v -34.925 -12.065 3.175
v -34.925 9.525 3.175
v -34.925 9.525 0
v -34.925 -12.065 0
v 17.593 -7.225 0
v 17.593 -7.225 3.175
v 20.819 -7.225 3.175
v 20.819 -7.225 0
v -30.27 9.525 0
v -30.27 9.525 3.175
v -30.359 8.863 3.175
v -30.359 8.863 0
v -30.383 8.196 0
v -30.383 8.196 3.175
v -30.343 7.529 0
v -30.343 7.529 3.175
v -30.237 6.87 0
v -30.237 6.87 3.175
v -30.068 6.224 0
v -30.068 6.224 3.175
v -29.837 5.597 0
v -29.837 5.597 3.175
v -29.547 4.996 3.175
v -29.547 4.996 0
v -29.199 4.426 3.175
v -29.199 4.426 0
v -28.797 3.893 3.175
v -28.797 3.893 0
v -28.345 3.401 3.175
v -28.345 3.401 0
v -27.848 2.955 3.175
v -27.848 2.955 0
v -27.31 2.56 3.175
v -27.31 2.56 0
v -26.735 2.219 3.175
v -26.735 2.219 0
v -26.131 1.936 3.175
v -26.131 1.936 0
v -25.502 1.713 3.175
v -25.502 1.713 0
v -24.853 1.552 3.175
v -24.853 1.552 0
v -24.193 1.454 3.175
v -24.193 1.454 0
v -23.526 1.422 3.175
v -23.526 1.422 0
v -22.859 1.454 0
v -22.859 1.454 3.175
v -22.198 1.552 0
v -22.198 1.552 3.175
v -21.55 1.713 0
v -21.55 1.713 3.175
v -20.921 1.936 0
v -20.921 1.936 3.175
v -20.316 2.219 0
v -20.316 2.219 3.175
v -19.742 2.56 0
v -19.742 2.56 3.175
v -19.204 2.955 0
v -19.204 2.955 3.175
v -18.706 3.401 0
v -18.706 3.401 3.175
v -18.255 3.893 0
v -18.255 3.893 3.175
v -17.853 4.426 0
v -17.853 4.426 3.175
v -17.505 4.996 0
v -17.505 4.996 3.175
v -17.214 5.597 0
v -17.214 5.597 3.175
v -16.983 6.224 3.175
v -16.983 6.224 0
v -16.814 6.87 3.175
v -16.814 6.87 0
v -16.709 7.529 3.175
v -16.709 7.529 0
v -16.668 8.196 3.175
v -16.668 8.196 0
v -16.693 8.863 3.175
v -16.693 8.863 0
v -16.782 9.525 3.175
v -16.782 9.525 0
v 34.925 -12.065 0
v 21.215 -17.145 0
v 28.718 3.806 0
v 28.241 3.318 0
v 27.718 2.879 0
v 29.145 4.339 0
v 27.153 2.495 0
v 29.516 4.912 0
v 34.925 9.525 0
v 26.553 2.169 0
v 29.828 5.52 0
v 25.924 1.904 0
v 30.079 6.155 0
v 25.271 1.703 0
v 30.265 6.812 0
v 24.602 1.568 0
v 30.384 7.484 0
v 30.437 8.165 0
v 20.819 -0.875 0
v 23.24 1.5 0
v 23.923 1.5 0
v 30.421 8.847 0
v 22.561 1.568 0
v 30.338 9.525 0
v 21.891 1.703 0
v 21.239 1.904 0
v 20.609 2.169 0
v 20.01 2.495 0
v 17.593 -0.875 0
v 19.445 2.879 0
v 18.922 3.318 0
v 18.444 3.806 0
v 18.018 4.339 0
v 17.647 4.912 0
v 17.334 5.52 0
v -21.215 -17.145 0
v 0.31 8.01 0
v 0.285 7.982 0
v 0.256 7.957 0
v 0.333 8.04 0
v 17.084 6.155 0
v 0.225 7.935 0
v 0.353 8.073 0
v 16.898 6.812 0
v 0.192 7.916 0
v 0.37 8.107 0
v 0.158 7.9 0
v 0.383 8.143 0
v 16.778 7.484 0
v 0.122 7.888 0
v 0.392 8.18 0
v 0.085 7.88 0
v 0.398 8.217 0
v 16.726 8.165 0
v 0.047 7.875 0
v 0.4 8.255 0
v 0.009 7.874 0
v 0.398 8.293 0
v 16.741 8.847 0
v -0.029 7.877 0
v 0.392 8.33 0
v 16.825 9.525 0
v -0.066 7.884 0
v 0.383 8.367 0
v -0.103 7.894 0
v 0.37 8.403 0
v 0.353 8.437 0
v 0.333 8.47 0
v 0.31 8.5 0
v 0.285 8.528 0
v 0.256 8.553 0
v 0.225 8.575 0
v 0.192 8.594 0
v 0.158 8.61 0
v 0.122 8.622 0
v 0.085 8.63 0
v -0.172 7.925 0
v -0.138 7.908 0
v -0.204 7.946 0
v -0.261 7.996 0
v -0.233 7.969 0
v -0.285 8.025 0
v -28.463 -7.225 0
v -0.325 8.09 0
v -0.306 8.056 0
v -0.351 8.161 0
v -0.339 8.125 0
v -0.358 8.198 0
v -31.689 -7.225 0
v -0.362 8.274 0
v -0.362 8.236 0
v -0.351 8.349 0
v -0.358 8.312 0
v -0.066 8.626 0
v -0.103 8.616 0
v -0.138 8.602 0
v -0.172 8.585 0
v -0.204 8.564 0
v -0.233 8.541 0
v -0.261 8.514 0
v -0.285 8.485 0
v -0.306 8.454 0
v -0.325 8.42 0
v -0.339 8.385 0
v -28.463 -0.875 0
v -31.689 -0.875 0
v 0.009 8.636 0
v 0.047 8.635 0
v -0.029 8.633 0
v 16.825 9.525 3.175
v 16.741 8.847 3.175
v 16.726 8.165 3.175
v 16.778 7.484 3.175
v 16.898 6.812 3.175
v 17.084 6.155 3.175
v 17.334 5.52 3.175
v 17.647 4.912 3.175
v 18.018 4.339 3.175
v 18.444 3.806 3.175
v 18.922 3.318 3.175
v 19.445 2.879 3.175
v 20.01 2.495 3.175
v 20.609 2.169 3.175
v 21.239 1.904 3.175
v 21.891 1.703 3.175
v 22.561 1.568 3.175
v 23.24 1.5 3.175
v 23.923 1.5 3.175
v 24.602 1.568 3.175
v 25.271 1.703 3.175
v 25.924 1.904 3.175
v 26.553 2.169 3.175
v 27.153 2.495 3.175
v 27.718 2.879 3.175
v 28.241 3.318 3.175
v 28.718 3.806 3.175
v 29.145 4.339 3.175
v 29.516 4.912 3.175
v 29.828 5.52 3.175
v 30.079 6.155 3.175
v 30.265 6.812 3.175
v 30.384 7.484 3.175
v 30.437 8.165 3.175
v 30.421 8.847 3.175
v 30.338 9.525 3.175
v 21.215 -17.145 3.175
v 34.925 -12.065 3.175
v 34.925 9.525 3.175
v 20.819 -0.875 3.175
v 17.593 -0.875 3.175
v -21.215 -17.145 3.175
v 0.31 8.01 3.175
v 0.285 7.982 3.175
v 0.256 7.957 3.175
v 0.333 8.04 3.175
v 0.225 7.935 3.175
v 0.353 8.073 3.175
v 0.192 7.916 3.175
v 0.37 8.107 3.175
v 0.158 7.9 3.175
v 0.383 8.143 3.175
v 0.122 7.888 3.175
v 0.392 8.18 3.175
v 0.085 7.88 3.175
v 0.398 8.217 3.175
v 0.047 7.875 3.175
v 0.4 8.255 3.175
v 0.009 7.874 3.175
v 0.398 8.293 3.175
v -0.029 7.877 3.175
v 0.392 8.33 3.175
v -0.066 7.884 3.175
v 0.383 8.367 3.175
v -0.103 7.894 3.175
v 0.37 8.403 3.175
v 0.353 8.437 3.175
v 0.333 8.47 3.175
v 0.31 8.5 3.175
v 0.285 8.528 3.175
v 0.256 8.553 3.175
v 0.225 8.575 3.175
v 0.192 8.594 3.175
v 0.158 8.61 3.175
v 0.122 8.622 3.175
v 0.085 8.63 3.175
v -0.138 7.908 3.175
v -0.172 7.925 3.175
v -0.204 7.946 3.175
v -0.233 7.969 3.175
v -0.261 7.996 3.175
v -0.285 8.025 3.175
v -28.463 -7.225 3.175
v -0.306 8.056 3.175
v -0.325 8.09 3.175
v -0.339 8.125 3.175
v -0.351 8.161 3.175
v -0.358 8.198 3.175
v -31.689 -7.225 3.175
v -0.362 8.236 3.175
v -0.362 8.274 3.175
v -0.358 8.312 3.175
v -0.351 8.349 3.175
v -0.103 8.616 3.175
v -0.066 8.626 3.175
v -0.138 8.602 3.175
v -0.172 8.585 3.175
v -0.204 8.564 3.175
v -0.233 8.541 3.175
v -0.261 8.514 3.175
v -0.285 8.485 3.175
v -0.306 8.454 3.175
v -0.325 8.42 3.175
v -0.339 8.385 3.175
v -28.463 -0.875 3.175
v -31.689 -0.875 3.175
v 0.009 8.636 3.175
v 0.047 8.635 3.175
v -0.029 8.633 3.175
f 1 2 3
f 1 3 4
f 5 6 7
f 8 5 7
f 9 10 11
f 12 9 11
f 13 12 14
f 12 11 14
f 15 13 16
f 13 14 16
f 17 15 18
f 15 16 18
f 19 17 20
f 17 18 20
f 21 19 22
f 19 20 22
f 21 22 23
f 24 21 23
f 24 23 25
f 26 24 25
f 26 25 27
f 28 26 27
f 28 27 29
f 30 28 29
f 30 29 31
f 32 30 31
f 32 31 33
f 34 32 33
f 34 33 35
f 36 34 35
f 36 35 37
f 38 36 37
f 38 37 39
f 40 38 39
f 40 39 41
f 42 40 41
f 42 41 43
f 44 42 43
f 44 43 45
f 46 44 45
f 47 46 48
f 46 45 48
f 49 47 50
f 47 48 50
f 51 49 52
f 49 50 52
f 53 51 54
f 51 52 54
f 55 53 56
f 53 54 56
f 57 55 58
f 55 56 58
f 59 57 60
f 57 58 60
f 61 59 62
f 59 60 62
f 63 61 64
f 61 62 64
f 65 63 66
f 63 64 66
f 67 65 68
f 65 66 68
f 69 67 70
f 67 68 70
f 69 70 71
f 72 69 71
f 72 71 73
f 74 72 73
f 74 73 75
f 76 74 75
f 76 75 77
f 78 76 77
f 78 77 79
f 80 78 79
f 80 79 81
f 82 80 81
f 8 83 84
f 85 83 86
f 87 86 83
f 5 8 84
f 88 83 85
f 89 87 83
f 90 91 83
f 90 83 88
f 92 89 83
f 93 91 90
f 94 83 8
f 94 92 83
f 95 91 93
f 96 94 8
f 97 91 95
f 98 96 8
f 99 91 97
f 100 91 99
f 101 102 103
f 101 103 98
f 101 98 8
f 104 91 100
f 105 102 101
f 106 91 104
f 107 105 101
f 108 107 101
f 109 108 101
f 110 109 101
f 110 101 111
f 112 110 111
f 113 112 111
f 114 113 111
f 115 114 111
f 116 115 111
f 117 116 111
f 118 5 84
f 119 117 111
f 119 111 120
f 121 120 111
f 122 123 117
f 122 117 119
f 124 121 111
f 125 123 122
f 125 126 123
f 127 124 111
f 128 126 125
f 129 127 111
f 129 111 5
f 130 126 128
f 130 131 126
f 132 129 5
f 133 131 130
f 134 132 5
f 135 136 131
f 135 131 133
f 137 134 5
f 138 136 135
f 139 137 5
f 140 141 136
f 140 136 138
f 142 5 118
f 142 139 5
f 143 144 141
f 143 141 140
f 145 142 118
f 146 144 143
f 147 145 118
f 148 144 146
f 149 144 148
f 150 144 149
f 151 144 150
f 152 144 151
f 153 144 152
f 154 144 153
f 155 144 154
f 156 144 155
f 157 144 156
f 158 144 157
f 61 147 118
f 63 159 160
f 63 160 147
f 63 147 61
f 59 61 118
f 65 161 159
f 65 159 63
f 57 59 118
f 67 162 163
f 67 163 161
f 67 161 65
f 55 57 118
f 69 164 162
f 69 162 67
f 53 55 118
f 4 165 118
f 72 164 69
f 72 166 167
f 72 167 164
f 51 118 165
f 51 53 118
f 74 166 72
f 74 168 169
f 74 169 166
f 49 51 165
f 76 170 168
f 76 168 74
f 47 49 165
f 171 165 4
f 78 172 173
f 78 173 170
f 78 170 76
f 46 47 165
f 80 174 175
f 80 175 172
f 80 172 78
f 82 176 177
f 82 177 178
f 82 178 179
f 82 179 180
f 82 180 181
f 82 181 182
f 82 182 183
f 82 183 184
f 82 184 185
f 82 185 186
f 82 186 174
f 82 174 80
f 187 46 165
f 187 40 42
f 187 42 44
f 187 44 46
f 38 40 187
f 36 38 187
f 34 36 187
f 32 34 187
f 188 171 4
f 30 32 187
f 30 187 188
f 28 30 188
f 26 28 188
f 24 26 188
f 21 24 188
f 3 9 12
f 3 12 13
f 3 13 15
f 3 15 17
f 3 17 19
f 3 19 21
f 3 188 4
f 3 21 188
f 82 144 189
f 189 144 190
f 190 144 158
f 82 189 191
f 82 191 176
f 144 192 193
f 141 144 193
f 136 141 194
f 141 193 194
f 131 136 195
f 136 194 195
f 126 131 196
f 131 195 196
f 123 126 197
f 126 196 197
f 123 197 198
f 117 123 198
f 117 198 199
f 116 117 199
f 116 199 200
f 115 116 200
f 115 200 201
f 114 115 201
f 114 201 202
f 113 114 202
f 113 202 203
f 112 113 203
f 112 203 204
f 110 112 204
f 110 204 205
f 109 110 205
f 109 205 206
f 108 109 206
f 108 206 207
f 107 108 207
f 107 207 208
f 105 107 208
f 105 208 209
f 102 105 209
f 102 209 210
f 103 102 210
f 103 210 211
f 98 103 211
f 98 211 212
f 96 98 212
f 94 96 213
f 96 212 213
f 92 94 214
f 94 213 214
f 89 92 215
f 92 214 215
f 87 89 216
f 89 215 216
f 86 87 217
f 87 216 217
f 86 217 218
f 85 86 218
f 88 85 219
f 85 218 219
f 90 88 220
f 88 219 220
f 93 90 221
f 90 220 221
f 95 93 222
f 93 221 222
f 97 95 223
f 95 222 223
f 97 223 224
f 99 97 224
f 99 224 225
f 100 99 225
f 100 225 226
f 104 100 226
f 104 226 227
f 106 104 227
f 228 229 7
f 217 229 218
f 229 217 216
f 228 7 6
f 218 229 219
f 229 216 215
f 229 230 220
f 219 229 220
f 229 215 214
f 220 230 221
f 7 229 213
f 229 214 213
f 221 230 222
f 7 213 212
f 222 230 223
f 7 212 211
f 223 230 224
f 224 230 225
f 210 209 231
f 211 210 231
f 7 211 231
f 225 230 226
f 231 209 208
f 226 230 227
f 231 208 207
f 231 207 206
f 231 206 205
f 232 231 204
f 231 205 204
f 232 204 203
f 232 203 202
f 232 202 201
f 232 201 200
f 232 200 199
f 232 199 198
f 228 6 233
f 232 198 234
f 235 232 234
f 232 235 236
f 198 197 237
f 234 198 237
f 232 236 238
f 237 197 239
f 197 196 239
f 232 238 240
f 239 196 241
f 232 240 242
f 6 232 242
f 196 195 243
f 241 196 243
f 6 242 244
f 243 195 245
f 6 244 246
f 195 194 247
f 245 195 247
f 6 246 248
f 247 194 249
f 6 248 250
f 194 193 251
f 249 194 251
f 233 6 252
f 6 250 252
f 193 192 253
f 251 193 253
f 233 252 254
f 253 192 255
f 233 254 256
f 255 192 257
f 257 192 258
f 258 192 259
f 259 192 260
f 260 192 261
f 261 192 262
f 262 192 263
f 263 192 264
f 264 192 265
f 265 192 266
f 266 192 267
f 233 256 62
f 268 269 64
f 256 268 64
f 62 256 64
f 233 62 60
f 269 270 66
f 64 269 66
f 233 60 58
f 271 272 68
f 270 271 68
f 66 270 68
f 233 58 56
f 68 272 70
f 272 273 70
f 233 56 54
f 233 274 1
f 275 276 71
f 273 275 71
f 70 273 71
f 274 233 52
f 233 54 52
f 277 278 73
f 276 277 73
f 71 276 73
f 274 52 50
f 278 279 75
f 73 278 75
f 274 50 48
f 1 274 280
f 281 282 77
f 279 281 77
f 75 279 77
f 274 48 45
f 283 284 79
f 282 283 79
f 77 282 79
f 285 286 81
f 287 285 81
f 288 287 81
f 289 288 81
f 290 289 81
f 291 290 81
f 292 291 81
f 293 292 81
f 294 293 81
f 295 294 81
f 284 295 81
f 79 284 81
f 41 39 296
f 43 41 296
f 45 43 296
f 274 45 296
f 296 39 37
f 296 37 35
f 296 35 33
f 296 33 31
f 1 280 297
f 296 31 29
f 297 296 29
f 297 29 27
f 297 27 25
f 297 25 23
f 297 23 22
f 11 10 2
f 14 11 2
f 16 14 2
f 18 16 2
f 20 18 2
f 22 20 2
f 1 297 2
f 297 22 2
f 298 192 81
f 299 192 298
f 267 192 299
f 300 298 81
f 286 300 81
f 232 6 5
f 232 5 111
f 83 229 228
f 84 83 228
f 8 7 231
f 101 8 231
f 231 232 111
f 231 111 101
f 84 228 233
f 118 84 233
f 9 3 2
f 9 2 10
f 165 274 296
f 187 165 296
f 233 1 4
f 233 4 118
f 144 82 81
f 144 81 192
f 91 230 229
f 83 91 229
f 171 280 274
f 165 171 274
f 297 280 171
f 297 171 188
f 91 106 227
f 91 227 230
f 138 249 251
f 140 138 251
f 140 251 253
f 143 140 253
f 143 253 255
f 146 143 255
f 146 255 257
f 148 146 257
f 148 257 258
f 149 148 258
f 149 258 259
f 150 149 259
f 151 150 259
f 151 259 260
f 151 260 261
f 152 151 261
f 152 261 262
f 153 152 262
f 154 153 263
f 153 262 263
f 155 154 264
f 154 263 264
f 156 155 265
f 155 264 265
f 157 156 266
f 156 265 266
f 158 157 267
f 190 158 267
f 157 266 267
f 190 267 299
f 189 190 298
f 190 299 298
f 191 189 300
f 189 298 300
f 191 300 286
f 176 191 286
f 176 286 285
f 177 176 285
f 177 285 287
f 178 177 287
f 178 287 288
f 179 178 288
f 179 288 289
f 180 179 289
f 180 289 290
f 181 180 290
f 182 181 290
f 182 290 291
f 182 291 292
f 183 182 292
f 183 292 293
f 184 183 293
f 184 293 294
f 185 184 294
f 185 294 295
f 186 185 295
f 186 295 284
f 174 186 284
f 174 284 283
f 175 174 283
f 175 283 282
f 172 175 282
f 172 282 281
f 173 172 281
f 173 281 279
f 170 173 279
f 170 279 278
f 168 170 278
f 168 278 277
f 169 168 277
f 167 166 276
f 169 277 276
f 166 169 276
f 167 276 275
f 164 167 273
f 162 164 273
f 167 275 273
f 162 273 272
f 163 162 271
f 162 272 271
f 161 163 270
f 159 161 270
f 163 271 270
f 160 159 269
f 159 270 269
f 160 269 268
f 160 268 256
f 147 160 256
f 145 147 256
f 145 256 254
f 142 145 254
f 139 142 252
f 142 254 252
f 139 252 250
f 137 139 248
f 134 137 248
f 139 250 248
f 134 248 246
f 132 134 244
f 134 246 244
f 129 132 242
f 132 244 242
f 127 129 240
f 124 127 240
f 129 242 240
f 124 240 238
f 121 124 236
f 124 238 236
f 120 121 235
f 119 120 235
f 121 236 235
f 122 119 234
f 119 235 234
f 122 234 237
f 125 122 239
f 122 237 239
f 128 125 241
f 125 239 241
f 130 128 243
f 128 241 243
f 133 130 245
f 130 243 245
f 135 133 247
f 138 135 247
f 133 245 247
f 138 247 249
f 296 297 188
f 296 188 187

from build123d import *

# Parameters (mm, degrees)
SKETCH1_W                        = 69.85
SKETCH1_H                        = 19.05
MAIN_BODY_DEPTH                  = 3.175
CHIN_FEATURE_DEPTH               = 3.175
SKETCH10_W                       = 3.2258
SKETCH10_H                       = 6.35
CUT_FOR_TABS_DEPTH               = 4.175
CUT_FOR_LIP_MOTOR_APERTURE_DEPTH = 4.175
SKETCH12_R                       = 0.381
CUT_EXTRUDE1_DEPTH               = 4.175


with BuildPart() as part:
    # Sketch1 → main body (new body)
    with BuildSketch(Plane.XY):
        Rectangle(SKETCH1_W, SKETCH1_H)
    extrude(amount=MAIN_BODY_DEPTH)

    # Sketch9 → chin feature (add)
    with BuildSketch(Plane.XY.offset(3.175)):
        Polygon((-34.925, -9.525), (-34.925, -12.065), (-21.214947133, -17.145), (0, -17.145), (0, -9.525), align=None)
    chin_feature = extrude(amount=-CHIN_FEATURE_DEPTH)

    # mirror of chin feature: chin feature across plane
    add(chin_feature.mirror(Plane(origin=(0, 0, 0), x_dir=(0, 0, 1), z_dir=(1, 0, 0))))

    # Sketch10 → cut for tabs (cut, through all)
    with BuildSketch(Plane.XY.offset(3.175)):
        with Locations((-30.076100278, -4.050352196)):
            Rectangle(SKETCH10_W, SKETCH10_H)
        with Locations((19.20572281, -4.050352196)):
            Rectangle(SKETCH10_W, SKETCH10_H)
    extrude(amount=-CUT_FOR_TABS_DEPTH, mode=Mode.SUBTRACT)

    # Sketch11 → cut for lip motor aperture (cut, through all)
    with BuildSketch(Plane.XY.offset(3.175)):
        with BuildLine():
            Line((-23.576637278, 18.516146957), (-26.370637278, 18.516146957))
            Line((-26.370637278, 18.516146957), (-26.370637278, 14.520081328))
            ThreePointArc((-26.370637278, 14.520081328), (-23.470211189, 1.422172556), (-20.782637278, 14.565407781))
            Line((-20.782637278, 14.565407781), (-20.782637278, 18.516146957))
            Line((-20.782637278, 18.516146957), (-23.576637278, 18.516146957))
        make_face()
        with BuildLine():
            Line((23.530508447, 18.585729376), (20.736508447, 18.585729376))
            Line((20.736508447, 18.585729376), (20.736508447, 14.589663746))
            ThreePointArc((20.736508447, 14.589663746), (23.636934536, 1.491754974), (26.324508447, 14.634990199))
            Line((26.324508447, 14.634990199), (26.324508447, 18.585729376))
            Line((26.324508447, 18.585729376), (23.530508447, 18.585729376))
        make_face()
    extrude(amount=-CUT_FOR_LIP_MOTOR_APERTURE_DEPTH, mode=Mode.SUBTRACT)

    # Sketch12 → Cut-Extrude1 (cut, through all)
    with BuildSketch(Plane.XY.offset(3.175)):
        with Locations((0.018631462, 8.255)):
            Circle(SKETCH12_R)
    extrude(amount=-CUT_EXTRUDE1_DEPTH, mode=Mode.SUBTRACT)


solid = part.part
